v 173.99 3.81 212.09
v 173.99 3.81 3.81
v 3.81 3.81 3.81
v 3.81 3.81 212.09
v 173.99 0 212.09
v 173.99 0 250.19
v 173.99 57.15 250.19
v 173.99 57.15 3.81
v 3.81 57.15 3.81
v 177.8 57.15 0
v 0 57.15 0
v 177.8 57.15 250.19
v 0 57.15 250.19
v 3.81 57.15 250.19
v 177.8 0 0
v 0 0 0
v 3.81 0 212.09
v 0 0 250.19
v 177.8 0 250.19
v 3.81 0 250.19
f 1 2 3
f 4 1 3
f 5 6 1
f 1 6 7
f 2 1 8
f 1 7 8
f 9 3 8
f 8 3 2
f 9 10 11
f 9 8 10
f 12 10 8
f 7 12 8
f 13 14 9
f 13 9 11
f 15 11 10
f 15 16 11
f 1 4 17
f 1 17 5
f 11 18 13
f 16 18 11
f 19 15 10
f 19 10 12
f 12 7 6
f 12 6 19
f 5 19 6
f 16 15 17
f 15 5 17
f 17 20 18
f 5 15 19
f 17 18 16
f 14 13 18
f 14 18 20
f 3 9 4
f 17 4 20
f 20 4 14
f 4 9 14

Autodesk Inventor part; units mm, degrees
ref_plane "YZ Plane" through (0, 0, 0) normal (1, 0, 0) x (0, 1, 0)
ref_plane "XZ Plane" through (0, 0, 0) normal (0, 1, 0) x (-1, 0, 0)
ref_plane "XY Plane" through (0, 0, 0) normal (0, 0, 1) x (1, 0, 0)
sketch "Sketch1" plane through (0, 0, 0) normal (0, 1, 0) x (-1, 0, 0)
  line L0 (0, 0) -> (-177.8, 0)
  line L1 (-177.8, 0) -> (-177.8, 254)
  line L2 (-177.8, 254) -> (0, 254)
  line L3 (0, 254) -> (0, 0)
  dimension "d0" = 177.8
  dimension "d1" = 254
extrude "Extrusion1" add sketch "Sketch1" along normal blind 57.15
shell "Shell1" thickness 3.81 removed faces 1 at (118.5333, 57.15, 169.3333)
sketch "Sketch2" plane through (0, 0, 254) normal (0, 0, 1) x (1, 0, 0)
  line L0 (0, 0) -> (177.8, 0) projected
  line L1 (177.8, 0) -> (177.8, 57.15) projected
  line L2 (0, 57.15) -> (177.8, 57.15) projected
  line L3 (0, 0) -> (0, 57.15) projected
extrude "Extrusion2" cut sketch "Sketch2" against normal up to surface (3.81 mm away)
sketch "Sketch3" plane through (3.81, 3.81, 3.81) normal (0, 1, 0) x (1, 0, 0)
  line L0 (0, -246.38) -> (170.18, -246.38) projected
  line L1 (170.18, -246.38) -> (170.18, 0) projected
  line L2 (0, 0) -> (0, -246.38) projected
  line L3 (170.18, -246.38) -> (-1.2603, -246.38)
  line L4 (-1.2603, -246.38) -> (-1.2603, -208.28)
  line L5 (-1.2603, -208.28) -> (170.18, -208.28)
  line L6 (170.18, -208.28) -> (170.18, -246.38)
  point P0 (-3.81, 3.81)
  point P1 (0, -208.28)
  dimension "d7" = 38.1
extrude "Extrusion3" cut sketch "Sketch3" against normal through all contours L2 L5 L1 L0
properties part number "Component box top"
